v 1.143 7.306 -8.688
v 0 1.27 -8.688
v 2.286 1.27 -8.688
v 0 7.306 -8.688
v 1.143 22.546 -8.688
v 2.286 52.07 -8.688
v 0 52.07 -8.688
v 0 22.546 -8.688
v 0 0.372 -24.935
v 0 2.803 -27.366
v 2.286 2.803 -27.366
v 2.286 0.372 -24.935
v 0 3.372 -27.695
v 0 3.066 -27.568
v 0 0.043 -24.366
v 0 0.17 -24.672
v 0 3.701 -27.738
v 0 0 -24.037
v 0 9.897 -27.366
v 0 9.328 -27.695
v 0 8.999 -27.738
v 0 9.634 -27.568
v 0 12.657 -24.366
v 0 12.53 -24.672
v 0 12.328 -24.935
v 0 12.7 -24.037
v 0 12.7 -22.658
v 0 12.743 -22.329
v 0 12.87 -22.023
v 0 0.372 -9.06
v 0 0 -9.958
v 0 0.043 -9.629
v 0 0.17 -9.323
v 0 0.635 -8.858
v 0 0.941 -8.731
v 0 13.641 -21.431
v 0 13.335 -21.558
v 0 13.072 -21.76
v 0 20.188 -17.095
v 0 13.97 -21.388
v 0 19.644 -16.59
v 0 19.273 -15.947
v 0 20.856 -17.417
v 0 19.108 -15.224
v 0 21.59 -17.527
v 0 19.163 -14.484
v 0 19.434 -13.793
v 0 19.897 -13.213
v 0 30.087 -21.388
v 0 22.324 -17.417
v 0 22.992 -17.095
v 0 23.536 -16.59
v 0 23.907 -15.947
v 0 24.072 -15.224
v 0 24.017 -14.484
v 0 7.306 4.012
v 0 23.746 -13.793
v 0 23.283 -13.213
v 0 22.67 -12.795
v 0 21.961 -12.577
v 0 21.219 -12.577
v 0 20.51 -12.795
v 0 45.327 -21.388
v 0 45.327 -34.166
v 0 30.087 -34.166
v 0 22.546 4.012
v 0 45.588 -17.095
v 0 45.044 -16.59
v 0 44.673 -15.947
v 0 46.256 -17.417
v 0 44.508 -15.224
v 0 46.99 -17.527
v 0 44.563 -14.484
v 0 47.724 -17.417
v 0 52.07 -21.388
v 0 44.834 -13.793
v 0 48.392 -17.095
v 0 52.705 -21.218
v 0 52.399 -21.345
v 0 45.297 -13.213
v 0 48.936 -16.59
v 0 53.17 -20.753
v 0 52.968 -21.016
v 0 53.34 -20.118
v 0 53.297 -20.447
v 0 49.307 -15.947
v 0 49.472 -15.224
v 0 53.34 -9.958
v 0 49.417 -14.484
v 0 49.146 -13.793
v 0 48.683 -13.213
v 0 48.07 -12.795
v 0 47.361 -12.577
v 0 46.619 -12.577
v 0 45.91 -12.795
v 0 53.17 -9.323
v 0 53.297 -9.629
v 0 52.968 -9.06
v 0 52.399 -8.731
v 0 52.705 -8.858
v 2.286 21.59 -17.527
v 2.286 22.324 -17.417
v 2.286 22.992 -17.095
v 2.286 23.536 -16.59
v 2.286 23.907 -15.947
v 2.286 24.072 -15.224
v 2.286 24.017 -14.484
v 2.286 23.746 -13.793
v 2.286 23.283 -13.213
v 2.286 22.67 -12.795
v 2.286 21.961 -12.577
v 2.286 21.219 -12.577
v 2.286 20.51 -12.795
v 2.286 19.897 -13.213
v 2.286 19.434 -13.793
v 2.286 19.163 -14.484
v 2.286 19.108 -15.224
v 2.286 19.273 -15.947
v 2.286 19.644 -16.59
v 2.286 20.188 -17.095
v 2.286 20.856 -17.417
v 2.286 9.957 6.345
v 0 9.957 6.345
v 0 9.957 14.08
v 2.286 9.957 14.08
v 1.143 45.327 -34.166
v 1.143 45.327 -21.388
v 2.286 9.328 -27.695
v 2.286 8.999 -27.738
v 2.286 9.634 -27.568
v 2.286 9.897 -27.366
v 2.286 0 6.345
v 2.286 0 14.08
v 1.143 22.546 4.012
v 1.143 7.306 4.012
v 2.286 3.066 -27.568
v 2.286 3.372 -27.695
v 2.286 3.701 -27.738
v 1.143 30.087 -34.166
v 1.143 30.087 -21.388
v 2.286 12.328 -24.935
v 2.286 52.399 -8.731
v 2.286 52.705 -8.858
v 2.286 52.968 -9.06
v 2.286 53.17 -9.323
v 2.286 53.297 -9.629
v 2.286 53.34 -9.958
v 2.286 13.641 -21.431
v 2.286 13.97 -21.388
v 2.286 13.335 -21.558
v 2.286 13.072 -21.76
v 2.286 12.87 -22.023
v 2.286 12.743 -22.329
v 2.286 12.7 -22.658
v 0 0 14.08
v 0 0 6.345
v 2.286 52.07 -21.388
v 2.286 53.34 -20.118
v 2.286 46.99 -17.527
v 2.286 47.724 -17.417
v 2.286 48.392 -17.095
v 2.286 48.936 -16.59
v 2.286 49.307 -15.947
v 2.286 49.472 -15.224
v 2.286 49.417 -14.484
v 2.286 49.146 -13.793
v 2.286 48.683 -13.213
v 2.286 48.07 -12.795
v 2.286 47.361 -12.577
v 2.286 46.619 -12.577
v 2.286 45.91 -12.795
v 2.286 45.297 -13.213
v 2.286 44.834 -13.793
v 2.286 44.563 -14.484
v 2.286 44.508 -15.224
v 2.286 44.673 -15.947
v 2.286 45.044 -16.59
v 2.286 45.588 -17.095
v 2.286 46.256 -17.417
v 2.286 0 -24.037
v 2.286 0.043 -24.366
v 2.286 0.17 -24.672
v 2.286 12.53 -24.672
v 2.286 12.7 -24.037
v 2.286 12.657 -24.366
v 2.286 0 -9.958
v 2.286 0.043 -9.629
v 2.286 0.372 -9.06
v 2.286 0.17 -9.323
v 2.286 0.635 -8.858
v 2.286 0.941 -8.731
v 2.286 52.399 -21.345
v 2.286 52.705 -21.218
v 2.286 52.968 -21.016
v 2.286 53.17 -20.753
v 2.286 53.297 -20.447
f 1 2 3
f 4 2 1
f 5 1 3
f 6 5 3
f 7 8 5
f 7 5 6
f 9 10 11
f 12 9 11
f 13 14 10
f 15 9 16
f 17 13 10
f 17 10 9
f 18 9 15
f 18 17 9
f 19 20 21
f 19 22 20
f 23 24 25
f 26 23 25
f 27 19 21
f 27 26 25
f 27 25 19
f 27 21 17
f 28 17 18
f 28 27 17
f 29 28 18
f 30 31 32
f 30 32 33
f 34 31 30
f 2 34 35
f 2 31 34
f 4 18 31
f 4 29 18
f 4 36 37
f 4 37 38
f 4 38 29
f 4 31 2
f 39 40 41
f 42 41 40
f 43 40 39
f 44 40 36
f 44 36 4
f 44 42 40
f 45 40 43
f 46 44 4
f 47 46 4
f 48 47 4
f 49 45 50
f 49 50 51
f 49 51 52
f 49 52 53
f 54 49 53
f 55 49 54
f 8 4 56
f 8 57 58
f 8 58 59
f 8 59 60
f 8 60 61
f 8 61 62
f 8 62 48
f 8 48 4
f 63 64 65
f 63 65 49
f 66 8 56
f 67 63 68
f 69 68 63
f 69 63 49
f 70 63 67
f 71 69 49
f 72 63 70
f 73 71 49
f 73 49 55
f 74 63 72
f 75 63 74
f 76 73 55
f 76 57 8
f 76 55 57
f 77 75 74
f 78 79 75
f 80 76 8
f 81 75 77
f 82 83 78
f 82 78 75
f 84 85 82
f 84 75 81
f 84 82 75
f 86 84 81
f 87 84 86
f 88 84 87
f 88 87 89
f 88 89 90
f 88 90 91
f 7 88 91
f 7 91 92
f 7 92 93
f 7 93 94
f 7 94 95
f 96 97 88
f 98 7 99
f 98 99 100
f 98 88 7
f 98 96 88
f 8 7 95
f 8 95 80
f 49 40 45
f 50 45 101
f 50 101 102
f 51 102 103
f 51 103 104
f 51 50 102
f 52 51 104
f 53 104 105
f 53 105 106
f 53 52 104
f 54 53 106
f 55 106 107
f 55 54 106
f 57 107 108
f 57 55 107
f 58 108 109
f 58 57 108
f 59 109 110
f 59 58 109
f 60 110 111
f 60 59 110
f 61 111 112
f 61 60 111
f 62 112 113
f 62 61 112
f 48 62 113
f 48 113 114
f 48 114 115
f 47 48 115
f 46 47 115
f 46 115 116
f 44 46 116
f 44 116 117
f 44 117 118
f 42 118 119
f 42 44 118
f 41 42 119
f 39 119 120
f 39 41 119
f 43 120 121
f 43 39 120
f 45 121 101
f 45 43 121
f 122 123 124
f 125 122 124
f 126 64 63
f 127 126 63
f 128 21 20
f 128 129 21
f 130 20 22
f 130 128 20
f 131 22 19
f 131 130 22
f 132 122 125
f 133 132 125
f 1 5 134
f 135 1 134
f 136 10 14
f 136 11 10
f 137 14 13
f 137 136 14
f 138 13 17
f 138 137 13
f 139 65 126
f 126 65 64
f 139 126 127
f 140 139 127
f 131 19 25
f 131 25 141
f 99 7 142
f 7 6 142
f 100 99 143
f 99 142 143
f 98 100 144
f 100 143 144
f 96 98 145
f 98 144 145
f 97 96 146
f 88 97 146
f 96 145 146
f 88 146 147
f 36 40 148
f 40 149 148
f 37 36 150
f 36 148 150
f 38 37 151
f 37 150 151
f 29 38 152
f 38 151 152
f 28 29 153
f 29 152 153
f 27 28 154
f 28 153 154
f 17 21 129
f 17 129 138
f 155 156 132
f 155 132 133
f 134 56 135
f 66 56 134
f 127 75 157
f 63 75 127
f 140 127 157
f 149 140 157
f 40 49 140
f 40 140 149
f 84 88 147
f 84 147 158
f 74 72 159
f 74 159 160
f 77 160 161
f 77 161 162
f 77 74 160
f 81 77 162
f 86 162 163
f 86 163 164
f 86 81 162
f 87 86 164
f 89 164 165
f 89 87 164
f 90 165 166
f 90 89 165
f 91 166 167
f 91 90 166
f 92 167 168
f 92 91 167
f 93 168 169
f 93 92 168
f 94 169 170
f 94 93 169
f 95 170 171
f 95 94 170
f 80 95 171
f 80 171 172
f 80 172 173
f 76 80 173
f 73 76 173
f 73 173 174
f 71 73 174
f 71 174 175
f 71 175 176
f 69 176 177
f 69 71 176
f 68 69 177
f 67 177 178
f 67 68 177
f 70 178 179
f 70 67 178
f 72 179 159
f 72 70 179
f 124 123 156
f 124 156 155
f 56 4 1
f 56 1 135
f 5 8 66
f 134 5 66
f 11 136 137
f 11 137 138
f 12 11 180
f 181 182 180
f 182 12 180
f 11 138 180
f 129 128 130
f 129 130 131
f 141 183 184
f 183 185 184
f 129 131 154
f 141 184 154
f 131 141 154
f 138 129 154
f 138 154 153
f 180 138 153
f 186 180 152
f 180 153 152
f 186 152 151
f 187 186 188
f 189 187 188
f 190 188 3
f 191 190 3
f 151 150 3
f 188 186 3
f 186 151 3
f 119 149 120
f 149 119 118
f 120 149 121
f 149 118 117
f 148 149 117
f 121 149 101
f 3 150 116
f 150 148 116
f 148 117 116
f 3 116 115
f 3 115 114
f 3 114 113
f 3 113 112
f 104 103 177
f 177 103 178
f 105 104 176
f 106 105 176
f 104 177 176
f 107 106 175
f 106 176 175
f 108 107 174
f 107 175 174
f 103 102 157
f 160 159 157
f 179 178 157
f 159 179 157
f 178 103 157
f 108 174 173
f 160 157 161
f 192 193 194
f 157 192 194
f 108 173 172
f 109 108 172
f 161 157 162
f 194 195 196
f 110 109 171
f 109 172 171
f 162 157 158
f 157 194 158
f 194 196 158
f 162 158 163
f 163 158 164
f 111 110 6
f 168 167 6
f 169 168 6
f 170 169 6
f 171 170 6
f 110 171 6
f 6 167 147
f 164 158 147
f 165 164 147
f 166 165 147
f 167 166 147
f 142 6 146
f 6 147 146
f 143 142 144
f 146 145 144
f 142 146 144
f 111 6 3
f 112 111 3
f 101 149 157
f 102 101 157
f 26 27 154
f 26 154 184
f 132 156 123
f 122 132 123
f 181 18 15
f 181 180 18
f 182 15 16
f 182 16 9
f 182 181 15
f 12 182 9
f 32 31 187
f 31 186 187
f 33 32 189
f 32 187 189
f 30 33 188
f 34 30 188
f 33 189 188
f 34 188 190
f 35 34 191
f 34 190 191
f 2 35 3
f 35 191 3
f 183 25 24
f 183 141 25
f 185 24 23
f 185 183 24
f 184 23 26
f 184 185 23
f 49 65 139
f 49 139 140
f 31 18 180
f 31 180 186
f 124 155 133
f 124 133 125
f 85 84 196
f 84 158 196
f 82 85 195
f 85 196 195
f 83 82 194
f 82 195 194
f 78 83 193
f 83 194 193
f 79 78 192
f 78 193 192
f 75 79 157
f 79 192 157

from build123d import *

# Parameters (mm, degrees)
SKETCH1_R           = 2.4892
BOSS_EXTRUDE1_DEPTH = 2.286
CHAMFER1_SIZE       = 3.175
FILLET2_R           = 1.27
SKETCH3_W           = 7.735009394
SKETCH3_H           = 9.957239347
BOSS_EXTRUDE2_DEPTH = 2.286
SKETCH5_W           = 12.7
SKETCH5_H           = 15.24
SKETCH5_W_2         = 12.777654753
BOSS_EXTRUDE3_DEPTH = 1.143


with BuildPart() as part:
    # Sketch1 → Boss-Extrude1 (new body)
    with BuildSketch(Plane(origin=(0, 0, -8.688049905), x_dir=(0, 0, -1), z_dir=(1, 0, 0))):
        Polygon((0, 0), (0, 53.34), (12.7, 53.34), (12.7, 12.7), (19.05, 12.7), (19.05, 0), align=None)
        with Locations((6.35, 46.99)):
            Circle(SKETCH1_R, mode=Mode.SUBTRACT)
        with Locations((6.35, 21.59)):
            Circle(SKETCH1_R, mode=Mode.SUBTRACT)
    extrude(amount=BOSS_EXTRUDE1_DEPTH)

    # Chamfer1
    chamfer1_edges = [part.edges().sort_by_distance(p)[0] for p in [
        (1.143, 12.7, -27.738049905),
        (1.143, 0, -27.738049905),
    ]]
    chamfer(chamfer1_edges, length=CHAMFER1_SIZE)

    # Fillet2
    fillet2_edges = [part.edges().sort_by_distance(p)[0] for p in [
        (1.143, 0, -8.688049905),
        (1.143, 53.34, -8.688049905),
        (1.143, 53.34, -21.388049905),
        (1.143, 12.7, -21.388049905),
        (1.143, 9.525, -27.738049905),
        (1.143, 3.175, -27.738049905),
        (1.143, 0, -24.563049905),
        (1.143, 12.7, -24.563049905),
    ]]
    fillet(fillet2_edges, radius=FILLET2_R)

    # Sketch5 → Boss-Extrude3 (add)
    with BuildSketch(Plane.ZY):
        with Locations((-2.338049905, 14.926432306)):
            Rectangle(SKETCH5_W, SKETCH5_H)
        with Locations((-27.776877282, 37.707148949)):
            Rectangle(SKETCH5_W_2, SKETCH5_H)
    extrude(amount=-BOSS_EXTRUDE3_DEPTH)


with BuildPart() as body_2:
    # Sketch3 → Boss-Extrude2 (new body)
    with BuildSketch(Plane.ZY):
        with Locations((10.2128886, 4.978619673)):
            Rectangle(SKETCH3_W, SKETCH3_H)
    extrude(amount=-BOSS_EXTRUDE2_DEPTH)


solid = Compound([part.part, body_2.part])
